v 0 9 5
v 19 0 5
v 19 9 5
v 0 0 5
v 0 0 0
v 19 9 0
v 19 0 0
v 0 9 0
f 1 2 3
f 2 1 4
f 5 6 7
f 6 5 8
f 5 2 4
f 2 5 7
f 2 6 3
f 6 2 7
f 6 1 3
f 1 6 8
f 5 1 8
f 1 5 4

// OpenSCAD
// Generated by SolidPython 1.0.1 on 2020-07-29 00:46:56


cube(size = [19, 9, 5]);
/***********************************************
*********      SolidPython code:      **********
************************************************
 
# import packages: SolidPython
from solid import *
from solid.utils import *
from itertools import chain, combinations, permutations


class Resize:

    def __init__(self, scad_file):
        self.scad_file = scad_file
        #self.scad_file = import_scad(scad_file)
        # cone/cylinder param:
        self.r1 = 0
        self.r2 = 0
        self.h = 0
        # rectangular prism param:
        self.w = 0
        self.l = 0
        # ellipse param:
        self.r = 0

    # import OpenScad code (file name corresponds to shape)


    # classify shape + parameters
    def assign(self, param1, param2, param3):
        if self.scad_file == 'cone.scad':
            self.r1 = param1
            self.r2 = param2
            self.h = param3
        elif self.scad_file == 'cylinder.scad':
            self.r1 = param1
            self.r2 = param2
            self.h = param3
        elif self.scad_file == 'rectangularPrism.scad':
            self.h = param1
            self.l = param2
            self.w = param3
        else:
            self.r = param1
            self.h = param2

    # resize parameters
    def iterate(self):
        x = range(3, 20, 2)
        i = 1
        if self.scad_file == 'cone.scad':
            tempList = list(permutations(x, 2))
            for temp in tempList:
                param1 = temp[0]
                param2 = temp[1]
                filepath = 'produced_scad_files/' + 'cone' + str(param1) + '_' + str(param2) + '_' + '.scad'
                scad_render_to_file(cylinder(h=param1, r1=param2, r2=0), filepath)

        elif self.scad_file == 'cylinder.scad':
            tempList = list(permutations(x, 3))
            for temp in tempList:
                param1 = temp[0]
                param2 = temp[1]
                filepath = 'produced_scad_files/' + 'cylinder' + str(param1) + '_' + str(param2) + '_' + '.scad'
                scad_render_to_file(cylinder(h=param1, r1=param2, r2=param2), filepath)

        elif self.scad_file == 'rectangularPrism.scad':
            tempList = list(permutations(x, 3))
            for temp in tempList:
                param1 = temp[0]
                param2 = temp[1]
                param3 = temp[2]
                filepath = 'produced_scad_files/' + 'rectangularPrism' + str(param1) + '_' + str(param2) + '_' + str(
                    param3) + '.scad'
                scad_render_to_file(cube(size=(param1, param2, param3)), filepath)

        elif self.scad_file == 'ellipse.scad':
            tempList = list(permutations(x, 4))
            for temp in tempList:
                param1 = temp[0]
                param2 = temp[1]
                param3 = temp[2]
                param4 = temp[3]
                filepath = 'produced_scad_files/' + 'ellipse' + str(param1) + '_' + str(param2) + '_' + str(param3) + '_' + str(param4) + '.scad'
                scad_render_to_file(scale([param1, param2, param3])(sphere(r=param4)), filepath)

    def render_to_scadfile(self):
        scad_render_to_file(scad, 'example.scad') 
 
************************************************/
